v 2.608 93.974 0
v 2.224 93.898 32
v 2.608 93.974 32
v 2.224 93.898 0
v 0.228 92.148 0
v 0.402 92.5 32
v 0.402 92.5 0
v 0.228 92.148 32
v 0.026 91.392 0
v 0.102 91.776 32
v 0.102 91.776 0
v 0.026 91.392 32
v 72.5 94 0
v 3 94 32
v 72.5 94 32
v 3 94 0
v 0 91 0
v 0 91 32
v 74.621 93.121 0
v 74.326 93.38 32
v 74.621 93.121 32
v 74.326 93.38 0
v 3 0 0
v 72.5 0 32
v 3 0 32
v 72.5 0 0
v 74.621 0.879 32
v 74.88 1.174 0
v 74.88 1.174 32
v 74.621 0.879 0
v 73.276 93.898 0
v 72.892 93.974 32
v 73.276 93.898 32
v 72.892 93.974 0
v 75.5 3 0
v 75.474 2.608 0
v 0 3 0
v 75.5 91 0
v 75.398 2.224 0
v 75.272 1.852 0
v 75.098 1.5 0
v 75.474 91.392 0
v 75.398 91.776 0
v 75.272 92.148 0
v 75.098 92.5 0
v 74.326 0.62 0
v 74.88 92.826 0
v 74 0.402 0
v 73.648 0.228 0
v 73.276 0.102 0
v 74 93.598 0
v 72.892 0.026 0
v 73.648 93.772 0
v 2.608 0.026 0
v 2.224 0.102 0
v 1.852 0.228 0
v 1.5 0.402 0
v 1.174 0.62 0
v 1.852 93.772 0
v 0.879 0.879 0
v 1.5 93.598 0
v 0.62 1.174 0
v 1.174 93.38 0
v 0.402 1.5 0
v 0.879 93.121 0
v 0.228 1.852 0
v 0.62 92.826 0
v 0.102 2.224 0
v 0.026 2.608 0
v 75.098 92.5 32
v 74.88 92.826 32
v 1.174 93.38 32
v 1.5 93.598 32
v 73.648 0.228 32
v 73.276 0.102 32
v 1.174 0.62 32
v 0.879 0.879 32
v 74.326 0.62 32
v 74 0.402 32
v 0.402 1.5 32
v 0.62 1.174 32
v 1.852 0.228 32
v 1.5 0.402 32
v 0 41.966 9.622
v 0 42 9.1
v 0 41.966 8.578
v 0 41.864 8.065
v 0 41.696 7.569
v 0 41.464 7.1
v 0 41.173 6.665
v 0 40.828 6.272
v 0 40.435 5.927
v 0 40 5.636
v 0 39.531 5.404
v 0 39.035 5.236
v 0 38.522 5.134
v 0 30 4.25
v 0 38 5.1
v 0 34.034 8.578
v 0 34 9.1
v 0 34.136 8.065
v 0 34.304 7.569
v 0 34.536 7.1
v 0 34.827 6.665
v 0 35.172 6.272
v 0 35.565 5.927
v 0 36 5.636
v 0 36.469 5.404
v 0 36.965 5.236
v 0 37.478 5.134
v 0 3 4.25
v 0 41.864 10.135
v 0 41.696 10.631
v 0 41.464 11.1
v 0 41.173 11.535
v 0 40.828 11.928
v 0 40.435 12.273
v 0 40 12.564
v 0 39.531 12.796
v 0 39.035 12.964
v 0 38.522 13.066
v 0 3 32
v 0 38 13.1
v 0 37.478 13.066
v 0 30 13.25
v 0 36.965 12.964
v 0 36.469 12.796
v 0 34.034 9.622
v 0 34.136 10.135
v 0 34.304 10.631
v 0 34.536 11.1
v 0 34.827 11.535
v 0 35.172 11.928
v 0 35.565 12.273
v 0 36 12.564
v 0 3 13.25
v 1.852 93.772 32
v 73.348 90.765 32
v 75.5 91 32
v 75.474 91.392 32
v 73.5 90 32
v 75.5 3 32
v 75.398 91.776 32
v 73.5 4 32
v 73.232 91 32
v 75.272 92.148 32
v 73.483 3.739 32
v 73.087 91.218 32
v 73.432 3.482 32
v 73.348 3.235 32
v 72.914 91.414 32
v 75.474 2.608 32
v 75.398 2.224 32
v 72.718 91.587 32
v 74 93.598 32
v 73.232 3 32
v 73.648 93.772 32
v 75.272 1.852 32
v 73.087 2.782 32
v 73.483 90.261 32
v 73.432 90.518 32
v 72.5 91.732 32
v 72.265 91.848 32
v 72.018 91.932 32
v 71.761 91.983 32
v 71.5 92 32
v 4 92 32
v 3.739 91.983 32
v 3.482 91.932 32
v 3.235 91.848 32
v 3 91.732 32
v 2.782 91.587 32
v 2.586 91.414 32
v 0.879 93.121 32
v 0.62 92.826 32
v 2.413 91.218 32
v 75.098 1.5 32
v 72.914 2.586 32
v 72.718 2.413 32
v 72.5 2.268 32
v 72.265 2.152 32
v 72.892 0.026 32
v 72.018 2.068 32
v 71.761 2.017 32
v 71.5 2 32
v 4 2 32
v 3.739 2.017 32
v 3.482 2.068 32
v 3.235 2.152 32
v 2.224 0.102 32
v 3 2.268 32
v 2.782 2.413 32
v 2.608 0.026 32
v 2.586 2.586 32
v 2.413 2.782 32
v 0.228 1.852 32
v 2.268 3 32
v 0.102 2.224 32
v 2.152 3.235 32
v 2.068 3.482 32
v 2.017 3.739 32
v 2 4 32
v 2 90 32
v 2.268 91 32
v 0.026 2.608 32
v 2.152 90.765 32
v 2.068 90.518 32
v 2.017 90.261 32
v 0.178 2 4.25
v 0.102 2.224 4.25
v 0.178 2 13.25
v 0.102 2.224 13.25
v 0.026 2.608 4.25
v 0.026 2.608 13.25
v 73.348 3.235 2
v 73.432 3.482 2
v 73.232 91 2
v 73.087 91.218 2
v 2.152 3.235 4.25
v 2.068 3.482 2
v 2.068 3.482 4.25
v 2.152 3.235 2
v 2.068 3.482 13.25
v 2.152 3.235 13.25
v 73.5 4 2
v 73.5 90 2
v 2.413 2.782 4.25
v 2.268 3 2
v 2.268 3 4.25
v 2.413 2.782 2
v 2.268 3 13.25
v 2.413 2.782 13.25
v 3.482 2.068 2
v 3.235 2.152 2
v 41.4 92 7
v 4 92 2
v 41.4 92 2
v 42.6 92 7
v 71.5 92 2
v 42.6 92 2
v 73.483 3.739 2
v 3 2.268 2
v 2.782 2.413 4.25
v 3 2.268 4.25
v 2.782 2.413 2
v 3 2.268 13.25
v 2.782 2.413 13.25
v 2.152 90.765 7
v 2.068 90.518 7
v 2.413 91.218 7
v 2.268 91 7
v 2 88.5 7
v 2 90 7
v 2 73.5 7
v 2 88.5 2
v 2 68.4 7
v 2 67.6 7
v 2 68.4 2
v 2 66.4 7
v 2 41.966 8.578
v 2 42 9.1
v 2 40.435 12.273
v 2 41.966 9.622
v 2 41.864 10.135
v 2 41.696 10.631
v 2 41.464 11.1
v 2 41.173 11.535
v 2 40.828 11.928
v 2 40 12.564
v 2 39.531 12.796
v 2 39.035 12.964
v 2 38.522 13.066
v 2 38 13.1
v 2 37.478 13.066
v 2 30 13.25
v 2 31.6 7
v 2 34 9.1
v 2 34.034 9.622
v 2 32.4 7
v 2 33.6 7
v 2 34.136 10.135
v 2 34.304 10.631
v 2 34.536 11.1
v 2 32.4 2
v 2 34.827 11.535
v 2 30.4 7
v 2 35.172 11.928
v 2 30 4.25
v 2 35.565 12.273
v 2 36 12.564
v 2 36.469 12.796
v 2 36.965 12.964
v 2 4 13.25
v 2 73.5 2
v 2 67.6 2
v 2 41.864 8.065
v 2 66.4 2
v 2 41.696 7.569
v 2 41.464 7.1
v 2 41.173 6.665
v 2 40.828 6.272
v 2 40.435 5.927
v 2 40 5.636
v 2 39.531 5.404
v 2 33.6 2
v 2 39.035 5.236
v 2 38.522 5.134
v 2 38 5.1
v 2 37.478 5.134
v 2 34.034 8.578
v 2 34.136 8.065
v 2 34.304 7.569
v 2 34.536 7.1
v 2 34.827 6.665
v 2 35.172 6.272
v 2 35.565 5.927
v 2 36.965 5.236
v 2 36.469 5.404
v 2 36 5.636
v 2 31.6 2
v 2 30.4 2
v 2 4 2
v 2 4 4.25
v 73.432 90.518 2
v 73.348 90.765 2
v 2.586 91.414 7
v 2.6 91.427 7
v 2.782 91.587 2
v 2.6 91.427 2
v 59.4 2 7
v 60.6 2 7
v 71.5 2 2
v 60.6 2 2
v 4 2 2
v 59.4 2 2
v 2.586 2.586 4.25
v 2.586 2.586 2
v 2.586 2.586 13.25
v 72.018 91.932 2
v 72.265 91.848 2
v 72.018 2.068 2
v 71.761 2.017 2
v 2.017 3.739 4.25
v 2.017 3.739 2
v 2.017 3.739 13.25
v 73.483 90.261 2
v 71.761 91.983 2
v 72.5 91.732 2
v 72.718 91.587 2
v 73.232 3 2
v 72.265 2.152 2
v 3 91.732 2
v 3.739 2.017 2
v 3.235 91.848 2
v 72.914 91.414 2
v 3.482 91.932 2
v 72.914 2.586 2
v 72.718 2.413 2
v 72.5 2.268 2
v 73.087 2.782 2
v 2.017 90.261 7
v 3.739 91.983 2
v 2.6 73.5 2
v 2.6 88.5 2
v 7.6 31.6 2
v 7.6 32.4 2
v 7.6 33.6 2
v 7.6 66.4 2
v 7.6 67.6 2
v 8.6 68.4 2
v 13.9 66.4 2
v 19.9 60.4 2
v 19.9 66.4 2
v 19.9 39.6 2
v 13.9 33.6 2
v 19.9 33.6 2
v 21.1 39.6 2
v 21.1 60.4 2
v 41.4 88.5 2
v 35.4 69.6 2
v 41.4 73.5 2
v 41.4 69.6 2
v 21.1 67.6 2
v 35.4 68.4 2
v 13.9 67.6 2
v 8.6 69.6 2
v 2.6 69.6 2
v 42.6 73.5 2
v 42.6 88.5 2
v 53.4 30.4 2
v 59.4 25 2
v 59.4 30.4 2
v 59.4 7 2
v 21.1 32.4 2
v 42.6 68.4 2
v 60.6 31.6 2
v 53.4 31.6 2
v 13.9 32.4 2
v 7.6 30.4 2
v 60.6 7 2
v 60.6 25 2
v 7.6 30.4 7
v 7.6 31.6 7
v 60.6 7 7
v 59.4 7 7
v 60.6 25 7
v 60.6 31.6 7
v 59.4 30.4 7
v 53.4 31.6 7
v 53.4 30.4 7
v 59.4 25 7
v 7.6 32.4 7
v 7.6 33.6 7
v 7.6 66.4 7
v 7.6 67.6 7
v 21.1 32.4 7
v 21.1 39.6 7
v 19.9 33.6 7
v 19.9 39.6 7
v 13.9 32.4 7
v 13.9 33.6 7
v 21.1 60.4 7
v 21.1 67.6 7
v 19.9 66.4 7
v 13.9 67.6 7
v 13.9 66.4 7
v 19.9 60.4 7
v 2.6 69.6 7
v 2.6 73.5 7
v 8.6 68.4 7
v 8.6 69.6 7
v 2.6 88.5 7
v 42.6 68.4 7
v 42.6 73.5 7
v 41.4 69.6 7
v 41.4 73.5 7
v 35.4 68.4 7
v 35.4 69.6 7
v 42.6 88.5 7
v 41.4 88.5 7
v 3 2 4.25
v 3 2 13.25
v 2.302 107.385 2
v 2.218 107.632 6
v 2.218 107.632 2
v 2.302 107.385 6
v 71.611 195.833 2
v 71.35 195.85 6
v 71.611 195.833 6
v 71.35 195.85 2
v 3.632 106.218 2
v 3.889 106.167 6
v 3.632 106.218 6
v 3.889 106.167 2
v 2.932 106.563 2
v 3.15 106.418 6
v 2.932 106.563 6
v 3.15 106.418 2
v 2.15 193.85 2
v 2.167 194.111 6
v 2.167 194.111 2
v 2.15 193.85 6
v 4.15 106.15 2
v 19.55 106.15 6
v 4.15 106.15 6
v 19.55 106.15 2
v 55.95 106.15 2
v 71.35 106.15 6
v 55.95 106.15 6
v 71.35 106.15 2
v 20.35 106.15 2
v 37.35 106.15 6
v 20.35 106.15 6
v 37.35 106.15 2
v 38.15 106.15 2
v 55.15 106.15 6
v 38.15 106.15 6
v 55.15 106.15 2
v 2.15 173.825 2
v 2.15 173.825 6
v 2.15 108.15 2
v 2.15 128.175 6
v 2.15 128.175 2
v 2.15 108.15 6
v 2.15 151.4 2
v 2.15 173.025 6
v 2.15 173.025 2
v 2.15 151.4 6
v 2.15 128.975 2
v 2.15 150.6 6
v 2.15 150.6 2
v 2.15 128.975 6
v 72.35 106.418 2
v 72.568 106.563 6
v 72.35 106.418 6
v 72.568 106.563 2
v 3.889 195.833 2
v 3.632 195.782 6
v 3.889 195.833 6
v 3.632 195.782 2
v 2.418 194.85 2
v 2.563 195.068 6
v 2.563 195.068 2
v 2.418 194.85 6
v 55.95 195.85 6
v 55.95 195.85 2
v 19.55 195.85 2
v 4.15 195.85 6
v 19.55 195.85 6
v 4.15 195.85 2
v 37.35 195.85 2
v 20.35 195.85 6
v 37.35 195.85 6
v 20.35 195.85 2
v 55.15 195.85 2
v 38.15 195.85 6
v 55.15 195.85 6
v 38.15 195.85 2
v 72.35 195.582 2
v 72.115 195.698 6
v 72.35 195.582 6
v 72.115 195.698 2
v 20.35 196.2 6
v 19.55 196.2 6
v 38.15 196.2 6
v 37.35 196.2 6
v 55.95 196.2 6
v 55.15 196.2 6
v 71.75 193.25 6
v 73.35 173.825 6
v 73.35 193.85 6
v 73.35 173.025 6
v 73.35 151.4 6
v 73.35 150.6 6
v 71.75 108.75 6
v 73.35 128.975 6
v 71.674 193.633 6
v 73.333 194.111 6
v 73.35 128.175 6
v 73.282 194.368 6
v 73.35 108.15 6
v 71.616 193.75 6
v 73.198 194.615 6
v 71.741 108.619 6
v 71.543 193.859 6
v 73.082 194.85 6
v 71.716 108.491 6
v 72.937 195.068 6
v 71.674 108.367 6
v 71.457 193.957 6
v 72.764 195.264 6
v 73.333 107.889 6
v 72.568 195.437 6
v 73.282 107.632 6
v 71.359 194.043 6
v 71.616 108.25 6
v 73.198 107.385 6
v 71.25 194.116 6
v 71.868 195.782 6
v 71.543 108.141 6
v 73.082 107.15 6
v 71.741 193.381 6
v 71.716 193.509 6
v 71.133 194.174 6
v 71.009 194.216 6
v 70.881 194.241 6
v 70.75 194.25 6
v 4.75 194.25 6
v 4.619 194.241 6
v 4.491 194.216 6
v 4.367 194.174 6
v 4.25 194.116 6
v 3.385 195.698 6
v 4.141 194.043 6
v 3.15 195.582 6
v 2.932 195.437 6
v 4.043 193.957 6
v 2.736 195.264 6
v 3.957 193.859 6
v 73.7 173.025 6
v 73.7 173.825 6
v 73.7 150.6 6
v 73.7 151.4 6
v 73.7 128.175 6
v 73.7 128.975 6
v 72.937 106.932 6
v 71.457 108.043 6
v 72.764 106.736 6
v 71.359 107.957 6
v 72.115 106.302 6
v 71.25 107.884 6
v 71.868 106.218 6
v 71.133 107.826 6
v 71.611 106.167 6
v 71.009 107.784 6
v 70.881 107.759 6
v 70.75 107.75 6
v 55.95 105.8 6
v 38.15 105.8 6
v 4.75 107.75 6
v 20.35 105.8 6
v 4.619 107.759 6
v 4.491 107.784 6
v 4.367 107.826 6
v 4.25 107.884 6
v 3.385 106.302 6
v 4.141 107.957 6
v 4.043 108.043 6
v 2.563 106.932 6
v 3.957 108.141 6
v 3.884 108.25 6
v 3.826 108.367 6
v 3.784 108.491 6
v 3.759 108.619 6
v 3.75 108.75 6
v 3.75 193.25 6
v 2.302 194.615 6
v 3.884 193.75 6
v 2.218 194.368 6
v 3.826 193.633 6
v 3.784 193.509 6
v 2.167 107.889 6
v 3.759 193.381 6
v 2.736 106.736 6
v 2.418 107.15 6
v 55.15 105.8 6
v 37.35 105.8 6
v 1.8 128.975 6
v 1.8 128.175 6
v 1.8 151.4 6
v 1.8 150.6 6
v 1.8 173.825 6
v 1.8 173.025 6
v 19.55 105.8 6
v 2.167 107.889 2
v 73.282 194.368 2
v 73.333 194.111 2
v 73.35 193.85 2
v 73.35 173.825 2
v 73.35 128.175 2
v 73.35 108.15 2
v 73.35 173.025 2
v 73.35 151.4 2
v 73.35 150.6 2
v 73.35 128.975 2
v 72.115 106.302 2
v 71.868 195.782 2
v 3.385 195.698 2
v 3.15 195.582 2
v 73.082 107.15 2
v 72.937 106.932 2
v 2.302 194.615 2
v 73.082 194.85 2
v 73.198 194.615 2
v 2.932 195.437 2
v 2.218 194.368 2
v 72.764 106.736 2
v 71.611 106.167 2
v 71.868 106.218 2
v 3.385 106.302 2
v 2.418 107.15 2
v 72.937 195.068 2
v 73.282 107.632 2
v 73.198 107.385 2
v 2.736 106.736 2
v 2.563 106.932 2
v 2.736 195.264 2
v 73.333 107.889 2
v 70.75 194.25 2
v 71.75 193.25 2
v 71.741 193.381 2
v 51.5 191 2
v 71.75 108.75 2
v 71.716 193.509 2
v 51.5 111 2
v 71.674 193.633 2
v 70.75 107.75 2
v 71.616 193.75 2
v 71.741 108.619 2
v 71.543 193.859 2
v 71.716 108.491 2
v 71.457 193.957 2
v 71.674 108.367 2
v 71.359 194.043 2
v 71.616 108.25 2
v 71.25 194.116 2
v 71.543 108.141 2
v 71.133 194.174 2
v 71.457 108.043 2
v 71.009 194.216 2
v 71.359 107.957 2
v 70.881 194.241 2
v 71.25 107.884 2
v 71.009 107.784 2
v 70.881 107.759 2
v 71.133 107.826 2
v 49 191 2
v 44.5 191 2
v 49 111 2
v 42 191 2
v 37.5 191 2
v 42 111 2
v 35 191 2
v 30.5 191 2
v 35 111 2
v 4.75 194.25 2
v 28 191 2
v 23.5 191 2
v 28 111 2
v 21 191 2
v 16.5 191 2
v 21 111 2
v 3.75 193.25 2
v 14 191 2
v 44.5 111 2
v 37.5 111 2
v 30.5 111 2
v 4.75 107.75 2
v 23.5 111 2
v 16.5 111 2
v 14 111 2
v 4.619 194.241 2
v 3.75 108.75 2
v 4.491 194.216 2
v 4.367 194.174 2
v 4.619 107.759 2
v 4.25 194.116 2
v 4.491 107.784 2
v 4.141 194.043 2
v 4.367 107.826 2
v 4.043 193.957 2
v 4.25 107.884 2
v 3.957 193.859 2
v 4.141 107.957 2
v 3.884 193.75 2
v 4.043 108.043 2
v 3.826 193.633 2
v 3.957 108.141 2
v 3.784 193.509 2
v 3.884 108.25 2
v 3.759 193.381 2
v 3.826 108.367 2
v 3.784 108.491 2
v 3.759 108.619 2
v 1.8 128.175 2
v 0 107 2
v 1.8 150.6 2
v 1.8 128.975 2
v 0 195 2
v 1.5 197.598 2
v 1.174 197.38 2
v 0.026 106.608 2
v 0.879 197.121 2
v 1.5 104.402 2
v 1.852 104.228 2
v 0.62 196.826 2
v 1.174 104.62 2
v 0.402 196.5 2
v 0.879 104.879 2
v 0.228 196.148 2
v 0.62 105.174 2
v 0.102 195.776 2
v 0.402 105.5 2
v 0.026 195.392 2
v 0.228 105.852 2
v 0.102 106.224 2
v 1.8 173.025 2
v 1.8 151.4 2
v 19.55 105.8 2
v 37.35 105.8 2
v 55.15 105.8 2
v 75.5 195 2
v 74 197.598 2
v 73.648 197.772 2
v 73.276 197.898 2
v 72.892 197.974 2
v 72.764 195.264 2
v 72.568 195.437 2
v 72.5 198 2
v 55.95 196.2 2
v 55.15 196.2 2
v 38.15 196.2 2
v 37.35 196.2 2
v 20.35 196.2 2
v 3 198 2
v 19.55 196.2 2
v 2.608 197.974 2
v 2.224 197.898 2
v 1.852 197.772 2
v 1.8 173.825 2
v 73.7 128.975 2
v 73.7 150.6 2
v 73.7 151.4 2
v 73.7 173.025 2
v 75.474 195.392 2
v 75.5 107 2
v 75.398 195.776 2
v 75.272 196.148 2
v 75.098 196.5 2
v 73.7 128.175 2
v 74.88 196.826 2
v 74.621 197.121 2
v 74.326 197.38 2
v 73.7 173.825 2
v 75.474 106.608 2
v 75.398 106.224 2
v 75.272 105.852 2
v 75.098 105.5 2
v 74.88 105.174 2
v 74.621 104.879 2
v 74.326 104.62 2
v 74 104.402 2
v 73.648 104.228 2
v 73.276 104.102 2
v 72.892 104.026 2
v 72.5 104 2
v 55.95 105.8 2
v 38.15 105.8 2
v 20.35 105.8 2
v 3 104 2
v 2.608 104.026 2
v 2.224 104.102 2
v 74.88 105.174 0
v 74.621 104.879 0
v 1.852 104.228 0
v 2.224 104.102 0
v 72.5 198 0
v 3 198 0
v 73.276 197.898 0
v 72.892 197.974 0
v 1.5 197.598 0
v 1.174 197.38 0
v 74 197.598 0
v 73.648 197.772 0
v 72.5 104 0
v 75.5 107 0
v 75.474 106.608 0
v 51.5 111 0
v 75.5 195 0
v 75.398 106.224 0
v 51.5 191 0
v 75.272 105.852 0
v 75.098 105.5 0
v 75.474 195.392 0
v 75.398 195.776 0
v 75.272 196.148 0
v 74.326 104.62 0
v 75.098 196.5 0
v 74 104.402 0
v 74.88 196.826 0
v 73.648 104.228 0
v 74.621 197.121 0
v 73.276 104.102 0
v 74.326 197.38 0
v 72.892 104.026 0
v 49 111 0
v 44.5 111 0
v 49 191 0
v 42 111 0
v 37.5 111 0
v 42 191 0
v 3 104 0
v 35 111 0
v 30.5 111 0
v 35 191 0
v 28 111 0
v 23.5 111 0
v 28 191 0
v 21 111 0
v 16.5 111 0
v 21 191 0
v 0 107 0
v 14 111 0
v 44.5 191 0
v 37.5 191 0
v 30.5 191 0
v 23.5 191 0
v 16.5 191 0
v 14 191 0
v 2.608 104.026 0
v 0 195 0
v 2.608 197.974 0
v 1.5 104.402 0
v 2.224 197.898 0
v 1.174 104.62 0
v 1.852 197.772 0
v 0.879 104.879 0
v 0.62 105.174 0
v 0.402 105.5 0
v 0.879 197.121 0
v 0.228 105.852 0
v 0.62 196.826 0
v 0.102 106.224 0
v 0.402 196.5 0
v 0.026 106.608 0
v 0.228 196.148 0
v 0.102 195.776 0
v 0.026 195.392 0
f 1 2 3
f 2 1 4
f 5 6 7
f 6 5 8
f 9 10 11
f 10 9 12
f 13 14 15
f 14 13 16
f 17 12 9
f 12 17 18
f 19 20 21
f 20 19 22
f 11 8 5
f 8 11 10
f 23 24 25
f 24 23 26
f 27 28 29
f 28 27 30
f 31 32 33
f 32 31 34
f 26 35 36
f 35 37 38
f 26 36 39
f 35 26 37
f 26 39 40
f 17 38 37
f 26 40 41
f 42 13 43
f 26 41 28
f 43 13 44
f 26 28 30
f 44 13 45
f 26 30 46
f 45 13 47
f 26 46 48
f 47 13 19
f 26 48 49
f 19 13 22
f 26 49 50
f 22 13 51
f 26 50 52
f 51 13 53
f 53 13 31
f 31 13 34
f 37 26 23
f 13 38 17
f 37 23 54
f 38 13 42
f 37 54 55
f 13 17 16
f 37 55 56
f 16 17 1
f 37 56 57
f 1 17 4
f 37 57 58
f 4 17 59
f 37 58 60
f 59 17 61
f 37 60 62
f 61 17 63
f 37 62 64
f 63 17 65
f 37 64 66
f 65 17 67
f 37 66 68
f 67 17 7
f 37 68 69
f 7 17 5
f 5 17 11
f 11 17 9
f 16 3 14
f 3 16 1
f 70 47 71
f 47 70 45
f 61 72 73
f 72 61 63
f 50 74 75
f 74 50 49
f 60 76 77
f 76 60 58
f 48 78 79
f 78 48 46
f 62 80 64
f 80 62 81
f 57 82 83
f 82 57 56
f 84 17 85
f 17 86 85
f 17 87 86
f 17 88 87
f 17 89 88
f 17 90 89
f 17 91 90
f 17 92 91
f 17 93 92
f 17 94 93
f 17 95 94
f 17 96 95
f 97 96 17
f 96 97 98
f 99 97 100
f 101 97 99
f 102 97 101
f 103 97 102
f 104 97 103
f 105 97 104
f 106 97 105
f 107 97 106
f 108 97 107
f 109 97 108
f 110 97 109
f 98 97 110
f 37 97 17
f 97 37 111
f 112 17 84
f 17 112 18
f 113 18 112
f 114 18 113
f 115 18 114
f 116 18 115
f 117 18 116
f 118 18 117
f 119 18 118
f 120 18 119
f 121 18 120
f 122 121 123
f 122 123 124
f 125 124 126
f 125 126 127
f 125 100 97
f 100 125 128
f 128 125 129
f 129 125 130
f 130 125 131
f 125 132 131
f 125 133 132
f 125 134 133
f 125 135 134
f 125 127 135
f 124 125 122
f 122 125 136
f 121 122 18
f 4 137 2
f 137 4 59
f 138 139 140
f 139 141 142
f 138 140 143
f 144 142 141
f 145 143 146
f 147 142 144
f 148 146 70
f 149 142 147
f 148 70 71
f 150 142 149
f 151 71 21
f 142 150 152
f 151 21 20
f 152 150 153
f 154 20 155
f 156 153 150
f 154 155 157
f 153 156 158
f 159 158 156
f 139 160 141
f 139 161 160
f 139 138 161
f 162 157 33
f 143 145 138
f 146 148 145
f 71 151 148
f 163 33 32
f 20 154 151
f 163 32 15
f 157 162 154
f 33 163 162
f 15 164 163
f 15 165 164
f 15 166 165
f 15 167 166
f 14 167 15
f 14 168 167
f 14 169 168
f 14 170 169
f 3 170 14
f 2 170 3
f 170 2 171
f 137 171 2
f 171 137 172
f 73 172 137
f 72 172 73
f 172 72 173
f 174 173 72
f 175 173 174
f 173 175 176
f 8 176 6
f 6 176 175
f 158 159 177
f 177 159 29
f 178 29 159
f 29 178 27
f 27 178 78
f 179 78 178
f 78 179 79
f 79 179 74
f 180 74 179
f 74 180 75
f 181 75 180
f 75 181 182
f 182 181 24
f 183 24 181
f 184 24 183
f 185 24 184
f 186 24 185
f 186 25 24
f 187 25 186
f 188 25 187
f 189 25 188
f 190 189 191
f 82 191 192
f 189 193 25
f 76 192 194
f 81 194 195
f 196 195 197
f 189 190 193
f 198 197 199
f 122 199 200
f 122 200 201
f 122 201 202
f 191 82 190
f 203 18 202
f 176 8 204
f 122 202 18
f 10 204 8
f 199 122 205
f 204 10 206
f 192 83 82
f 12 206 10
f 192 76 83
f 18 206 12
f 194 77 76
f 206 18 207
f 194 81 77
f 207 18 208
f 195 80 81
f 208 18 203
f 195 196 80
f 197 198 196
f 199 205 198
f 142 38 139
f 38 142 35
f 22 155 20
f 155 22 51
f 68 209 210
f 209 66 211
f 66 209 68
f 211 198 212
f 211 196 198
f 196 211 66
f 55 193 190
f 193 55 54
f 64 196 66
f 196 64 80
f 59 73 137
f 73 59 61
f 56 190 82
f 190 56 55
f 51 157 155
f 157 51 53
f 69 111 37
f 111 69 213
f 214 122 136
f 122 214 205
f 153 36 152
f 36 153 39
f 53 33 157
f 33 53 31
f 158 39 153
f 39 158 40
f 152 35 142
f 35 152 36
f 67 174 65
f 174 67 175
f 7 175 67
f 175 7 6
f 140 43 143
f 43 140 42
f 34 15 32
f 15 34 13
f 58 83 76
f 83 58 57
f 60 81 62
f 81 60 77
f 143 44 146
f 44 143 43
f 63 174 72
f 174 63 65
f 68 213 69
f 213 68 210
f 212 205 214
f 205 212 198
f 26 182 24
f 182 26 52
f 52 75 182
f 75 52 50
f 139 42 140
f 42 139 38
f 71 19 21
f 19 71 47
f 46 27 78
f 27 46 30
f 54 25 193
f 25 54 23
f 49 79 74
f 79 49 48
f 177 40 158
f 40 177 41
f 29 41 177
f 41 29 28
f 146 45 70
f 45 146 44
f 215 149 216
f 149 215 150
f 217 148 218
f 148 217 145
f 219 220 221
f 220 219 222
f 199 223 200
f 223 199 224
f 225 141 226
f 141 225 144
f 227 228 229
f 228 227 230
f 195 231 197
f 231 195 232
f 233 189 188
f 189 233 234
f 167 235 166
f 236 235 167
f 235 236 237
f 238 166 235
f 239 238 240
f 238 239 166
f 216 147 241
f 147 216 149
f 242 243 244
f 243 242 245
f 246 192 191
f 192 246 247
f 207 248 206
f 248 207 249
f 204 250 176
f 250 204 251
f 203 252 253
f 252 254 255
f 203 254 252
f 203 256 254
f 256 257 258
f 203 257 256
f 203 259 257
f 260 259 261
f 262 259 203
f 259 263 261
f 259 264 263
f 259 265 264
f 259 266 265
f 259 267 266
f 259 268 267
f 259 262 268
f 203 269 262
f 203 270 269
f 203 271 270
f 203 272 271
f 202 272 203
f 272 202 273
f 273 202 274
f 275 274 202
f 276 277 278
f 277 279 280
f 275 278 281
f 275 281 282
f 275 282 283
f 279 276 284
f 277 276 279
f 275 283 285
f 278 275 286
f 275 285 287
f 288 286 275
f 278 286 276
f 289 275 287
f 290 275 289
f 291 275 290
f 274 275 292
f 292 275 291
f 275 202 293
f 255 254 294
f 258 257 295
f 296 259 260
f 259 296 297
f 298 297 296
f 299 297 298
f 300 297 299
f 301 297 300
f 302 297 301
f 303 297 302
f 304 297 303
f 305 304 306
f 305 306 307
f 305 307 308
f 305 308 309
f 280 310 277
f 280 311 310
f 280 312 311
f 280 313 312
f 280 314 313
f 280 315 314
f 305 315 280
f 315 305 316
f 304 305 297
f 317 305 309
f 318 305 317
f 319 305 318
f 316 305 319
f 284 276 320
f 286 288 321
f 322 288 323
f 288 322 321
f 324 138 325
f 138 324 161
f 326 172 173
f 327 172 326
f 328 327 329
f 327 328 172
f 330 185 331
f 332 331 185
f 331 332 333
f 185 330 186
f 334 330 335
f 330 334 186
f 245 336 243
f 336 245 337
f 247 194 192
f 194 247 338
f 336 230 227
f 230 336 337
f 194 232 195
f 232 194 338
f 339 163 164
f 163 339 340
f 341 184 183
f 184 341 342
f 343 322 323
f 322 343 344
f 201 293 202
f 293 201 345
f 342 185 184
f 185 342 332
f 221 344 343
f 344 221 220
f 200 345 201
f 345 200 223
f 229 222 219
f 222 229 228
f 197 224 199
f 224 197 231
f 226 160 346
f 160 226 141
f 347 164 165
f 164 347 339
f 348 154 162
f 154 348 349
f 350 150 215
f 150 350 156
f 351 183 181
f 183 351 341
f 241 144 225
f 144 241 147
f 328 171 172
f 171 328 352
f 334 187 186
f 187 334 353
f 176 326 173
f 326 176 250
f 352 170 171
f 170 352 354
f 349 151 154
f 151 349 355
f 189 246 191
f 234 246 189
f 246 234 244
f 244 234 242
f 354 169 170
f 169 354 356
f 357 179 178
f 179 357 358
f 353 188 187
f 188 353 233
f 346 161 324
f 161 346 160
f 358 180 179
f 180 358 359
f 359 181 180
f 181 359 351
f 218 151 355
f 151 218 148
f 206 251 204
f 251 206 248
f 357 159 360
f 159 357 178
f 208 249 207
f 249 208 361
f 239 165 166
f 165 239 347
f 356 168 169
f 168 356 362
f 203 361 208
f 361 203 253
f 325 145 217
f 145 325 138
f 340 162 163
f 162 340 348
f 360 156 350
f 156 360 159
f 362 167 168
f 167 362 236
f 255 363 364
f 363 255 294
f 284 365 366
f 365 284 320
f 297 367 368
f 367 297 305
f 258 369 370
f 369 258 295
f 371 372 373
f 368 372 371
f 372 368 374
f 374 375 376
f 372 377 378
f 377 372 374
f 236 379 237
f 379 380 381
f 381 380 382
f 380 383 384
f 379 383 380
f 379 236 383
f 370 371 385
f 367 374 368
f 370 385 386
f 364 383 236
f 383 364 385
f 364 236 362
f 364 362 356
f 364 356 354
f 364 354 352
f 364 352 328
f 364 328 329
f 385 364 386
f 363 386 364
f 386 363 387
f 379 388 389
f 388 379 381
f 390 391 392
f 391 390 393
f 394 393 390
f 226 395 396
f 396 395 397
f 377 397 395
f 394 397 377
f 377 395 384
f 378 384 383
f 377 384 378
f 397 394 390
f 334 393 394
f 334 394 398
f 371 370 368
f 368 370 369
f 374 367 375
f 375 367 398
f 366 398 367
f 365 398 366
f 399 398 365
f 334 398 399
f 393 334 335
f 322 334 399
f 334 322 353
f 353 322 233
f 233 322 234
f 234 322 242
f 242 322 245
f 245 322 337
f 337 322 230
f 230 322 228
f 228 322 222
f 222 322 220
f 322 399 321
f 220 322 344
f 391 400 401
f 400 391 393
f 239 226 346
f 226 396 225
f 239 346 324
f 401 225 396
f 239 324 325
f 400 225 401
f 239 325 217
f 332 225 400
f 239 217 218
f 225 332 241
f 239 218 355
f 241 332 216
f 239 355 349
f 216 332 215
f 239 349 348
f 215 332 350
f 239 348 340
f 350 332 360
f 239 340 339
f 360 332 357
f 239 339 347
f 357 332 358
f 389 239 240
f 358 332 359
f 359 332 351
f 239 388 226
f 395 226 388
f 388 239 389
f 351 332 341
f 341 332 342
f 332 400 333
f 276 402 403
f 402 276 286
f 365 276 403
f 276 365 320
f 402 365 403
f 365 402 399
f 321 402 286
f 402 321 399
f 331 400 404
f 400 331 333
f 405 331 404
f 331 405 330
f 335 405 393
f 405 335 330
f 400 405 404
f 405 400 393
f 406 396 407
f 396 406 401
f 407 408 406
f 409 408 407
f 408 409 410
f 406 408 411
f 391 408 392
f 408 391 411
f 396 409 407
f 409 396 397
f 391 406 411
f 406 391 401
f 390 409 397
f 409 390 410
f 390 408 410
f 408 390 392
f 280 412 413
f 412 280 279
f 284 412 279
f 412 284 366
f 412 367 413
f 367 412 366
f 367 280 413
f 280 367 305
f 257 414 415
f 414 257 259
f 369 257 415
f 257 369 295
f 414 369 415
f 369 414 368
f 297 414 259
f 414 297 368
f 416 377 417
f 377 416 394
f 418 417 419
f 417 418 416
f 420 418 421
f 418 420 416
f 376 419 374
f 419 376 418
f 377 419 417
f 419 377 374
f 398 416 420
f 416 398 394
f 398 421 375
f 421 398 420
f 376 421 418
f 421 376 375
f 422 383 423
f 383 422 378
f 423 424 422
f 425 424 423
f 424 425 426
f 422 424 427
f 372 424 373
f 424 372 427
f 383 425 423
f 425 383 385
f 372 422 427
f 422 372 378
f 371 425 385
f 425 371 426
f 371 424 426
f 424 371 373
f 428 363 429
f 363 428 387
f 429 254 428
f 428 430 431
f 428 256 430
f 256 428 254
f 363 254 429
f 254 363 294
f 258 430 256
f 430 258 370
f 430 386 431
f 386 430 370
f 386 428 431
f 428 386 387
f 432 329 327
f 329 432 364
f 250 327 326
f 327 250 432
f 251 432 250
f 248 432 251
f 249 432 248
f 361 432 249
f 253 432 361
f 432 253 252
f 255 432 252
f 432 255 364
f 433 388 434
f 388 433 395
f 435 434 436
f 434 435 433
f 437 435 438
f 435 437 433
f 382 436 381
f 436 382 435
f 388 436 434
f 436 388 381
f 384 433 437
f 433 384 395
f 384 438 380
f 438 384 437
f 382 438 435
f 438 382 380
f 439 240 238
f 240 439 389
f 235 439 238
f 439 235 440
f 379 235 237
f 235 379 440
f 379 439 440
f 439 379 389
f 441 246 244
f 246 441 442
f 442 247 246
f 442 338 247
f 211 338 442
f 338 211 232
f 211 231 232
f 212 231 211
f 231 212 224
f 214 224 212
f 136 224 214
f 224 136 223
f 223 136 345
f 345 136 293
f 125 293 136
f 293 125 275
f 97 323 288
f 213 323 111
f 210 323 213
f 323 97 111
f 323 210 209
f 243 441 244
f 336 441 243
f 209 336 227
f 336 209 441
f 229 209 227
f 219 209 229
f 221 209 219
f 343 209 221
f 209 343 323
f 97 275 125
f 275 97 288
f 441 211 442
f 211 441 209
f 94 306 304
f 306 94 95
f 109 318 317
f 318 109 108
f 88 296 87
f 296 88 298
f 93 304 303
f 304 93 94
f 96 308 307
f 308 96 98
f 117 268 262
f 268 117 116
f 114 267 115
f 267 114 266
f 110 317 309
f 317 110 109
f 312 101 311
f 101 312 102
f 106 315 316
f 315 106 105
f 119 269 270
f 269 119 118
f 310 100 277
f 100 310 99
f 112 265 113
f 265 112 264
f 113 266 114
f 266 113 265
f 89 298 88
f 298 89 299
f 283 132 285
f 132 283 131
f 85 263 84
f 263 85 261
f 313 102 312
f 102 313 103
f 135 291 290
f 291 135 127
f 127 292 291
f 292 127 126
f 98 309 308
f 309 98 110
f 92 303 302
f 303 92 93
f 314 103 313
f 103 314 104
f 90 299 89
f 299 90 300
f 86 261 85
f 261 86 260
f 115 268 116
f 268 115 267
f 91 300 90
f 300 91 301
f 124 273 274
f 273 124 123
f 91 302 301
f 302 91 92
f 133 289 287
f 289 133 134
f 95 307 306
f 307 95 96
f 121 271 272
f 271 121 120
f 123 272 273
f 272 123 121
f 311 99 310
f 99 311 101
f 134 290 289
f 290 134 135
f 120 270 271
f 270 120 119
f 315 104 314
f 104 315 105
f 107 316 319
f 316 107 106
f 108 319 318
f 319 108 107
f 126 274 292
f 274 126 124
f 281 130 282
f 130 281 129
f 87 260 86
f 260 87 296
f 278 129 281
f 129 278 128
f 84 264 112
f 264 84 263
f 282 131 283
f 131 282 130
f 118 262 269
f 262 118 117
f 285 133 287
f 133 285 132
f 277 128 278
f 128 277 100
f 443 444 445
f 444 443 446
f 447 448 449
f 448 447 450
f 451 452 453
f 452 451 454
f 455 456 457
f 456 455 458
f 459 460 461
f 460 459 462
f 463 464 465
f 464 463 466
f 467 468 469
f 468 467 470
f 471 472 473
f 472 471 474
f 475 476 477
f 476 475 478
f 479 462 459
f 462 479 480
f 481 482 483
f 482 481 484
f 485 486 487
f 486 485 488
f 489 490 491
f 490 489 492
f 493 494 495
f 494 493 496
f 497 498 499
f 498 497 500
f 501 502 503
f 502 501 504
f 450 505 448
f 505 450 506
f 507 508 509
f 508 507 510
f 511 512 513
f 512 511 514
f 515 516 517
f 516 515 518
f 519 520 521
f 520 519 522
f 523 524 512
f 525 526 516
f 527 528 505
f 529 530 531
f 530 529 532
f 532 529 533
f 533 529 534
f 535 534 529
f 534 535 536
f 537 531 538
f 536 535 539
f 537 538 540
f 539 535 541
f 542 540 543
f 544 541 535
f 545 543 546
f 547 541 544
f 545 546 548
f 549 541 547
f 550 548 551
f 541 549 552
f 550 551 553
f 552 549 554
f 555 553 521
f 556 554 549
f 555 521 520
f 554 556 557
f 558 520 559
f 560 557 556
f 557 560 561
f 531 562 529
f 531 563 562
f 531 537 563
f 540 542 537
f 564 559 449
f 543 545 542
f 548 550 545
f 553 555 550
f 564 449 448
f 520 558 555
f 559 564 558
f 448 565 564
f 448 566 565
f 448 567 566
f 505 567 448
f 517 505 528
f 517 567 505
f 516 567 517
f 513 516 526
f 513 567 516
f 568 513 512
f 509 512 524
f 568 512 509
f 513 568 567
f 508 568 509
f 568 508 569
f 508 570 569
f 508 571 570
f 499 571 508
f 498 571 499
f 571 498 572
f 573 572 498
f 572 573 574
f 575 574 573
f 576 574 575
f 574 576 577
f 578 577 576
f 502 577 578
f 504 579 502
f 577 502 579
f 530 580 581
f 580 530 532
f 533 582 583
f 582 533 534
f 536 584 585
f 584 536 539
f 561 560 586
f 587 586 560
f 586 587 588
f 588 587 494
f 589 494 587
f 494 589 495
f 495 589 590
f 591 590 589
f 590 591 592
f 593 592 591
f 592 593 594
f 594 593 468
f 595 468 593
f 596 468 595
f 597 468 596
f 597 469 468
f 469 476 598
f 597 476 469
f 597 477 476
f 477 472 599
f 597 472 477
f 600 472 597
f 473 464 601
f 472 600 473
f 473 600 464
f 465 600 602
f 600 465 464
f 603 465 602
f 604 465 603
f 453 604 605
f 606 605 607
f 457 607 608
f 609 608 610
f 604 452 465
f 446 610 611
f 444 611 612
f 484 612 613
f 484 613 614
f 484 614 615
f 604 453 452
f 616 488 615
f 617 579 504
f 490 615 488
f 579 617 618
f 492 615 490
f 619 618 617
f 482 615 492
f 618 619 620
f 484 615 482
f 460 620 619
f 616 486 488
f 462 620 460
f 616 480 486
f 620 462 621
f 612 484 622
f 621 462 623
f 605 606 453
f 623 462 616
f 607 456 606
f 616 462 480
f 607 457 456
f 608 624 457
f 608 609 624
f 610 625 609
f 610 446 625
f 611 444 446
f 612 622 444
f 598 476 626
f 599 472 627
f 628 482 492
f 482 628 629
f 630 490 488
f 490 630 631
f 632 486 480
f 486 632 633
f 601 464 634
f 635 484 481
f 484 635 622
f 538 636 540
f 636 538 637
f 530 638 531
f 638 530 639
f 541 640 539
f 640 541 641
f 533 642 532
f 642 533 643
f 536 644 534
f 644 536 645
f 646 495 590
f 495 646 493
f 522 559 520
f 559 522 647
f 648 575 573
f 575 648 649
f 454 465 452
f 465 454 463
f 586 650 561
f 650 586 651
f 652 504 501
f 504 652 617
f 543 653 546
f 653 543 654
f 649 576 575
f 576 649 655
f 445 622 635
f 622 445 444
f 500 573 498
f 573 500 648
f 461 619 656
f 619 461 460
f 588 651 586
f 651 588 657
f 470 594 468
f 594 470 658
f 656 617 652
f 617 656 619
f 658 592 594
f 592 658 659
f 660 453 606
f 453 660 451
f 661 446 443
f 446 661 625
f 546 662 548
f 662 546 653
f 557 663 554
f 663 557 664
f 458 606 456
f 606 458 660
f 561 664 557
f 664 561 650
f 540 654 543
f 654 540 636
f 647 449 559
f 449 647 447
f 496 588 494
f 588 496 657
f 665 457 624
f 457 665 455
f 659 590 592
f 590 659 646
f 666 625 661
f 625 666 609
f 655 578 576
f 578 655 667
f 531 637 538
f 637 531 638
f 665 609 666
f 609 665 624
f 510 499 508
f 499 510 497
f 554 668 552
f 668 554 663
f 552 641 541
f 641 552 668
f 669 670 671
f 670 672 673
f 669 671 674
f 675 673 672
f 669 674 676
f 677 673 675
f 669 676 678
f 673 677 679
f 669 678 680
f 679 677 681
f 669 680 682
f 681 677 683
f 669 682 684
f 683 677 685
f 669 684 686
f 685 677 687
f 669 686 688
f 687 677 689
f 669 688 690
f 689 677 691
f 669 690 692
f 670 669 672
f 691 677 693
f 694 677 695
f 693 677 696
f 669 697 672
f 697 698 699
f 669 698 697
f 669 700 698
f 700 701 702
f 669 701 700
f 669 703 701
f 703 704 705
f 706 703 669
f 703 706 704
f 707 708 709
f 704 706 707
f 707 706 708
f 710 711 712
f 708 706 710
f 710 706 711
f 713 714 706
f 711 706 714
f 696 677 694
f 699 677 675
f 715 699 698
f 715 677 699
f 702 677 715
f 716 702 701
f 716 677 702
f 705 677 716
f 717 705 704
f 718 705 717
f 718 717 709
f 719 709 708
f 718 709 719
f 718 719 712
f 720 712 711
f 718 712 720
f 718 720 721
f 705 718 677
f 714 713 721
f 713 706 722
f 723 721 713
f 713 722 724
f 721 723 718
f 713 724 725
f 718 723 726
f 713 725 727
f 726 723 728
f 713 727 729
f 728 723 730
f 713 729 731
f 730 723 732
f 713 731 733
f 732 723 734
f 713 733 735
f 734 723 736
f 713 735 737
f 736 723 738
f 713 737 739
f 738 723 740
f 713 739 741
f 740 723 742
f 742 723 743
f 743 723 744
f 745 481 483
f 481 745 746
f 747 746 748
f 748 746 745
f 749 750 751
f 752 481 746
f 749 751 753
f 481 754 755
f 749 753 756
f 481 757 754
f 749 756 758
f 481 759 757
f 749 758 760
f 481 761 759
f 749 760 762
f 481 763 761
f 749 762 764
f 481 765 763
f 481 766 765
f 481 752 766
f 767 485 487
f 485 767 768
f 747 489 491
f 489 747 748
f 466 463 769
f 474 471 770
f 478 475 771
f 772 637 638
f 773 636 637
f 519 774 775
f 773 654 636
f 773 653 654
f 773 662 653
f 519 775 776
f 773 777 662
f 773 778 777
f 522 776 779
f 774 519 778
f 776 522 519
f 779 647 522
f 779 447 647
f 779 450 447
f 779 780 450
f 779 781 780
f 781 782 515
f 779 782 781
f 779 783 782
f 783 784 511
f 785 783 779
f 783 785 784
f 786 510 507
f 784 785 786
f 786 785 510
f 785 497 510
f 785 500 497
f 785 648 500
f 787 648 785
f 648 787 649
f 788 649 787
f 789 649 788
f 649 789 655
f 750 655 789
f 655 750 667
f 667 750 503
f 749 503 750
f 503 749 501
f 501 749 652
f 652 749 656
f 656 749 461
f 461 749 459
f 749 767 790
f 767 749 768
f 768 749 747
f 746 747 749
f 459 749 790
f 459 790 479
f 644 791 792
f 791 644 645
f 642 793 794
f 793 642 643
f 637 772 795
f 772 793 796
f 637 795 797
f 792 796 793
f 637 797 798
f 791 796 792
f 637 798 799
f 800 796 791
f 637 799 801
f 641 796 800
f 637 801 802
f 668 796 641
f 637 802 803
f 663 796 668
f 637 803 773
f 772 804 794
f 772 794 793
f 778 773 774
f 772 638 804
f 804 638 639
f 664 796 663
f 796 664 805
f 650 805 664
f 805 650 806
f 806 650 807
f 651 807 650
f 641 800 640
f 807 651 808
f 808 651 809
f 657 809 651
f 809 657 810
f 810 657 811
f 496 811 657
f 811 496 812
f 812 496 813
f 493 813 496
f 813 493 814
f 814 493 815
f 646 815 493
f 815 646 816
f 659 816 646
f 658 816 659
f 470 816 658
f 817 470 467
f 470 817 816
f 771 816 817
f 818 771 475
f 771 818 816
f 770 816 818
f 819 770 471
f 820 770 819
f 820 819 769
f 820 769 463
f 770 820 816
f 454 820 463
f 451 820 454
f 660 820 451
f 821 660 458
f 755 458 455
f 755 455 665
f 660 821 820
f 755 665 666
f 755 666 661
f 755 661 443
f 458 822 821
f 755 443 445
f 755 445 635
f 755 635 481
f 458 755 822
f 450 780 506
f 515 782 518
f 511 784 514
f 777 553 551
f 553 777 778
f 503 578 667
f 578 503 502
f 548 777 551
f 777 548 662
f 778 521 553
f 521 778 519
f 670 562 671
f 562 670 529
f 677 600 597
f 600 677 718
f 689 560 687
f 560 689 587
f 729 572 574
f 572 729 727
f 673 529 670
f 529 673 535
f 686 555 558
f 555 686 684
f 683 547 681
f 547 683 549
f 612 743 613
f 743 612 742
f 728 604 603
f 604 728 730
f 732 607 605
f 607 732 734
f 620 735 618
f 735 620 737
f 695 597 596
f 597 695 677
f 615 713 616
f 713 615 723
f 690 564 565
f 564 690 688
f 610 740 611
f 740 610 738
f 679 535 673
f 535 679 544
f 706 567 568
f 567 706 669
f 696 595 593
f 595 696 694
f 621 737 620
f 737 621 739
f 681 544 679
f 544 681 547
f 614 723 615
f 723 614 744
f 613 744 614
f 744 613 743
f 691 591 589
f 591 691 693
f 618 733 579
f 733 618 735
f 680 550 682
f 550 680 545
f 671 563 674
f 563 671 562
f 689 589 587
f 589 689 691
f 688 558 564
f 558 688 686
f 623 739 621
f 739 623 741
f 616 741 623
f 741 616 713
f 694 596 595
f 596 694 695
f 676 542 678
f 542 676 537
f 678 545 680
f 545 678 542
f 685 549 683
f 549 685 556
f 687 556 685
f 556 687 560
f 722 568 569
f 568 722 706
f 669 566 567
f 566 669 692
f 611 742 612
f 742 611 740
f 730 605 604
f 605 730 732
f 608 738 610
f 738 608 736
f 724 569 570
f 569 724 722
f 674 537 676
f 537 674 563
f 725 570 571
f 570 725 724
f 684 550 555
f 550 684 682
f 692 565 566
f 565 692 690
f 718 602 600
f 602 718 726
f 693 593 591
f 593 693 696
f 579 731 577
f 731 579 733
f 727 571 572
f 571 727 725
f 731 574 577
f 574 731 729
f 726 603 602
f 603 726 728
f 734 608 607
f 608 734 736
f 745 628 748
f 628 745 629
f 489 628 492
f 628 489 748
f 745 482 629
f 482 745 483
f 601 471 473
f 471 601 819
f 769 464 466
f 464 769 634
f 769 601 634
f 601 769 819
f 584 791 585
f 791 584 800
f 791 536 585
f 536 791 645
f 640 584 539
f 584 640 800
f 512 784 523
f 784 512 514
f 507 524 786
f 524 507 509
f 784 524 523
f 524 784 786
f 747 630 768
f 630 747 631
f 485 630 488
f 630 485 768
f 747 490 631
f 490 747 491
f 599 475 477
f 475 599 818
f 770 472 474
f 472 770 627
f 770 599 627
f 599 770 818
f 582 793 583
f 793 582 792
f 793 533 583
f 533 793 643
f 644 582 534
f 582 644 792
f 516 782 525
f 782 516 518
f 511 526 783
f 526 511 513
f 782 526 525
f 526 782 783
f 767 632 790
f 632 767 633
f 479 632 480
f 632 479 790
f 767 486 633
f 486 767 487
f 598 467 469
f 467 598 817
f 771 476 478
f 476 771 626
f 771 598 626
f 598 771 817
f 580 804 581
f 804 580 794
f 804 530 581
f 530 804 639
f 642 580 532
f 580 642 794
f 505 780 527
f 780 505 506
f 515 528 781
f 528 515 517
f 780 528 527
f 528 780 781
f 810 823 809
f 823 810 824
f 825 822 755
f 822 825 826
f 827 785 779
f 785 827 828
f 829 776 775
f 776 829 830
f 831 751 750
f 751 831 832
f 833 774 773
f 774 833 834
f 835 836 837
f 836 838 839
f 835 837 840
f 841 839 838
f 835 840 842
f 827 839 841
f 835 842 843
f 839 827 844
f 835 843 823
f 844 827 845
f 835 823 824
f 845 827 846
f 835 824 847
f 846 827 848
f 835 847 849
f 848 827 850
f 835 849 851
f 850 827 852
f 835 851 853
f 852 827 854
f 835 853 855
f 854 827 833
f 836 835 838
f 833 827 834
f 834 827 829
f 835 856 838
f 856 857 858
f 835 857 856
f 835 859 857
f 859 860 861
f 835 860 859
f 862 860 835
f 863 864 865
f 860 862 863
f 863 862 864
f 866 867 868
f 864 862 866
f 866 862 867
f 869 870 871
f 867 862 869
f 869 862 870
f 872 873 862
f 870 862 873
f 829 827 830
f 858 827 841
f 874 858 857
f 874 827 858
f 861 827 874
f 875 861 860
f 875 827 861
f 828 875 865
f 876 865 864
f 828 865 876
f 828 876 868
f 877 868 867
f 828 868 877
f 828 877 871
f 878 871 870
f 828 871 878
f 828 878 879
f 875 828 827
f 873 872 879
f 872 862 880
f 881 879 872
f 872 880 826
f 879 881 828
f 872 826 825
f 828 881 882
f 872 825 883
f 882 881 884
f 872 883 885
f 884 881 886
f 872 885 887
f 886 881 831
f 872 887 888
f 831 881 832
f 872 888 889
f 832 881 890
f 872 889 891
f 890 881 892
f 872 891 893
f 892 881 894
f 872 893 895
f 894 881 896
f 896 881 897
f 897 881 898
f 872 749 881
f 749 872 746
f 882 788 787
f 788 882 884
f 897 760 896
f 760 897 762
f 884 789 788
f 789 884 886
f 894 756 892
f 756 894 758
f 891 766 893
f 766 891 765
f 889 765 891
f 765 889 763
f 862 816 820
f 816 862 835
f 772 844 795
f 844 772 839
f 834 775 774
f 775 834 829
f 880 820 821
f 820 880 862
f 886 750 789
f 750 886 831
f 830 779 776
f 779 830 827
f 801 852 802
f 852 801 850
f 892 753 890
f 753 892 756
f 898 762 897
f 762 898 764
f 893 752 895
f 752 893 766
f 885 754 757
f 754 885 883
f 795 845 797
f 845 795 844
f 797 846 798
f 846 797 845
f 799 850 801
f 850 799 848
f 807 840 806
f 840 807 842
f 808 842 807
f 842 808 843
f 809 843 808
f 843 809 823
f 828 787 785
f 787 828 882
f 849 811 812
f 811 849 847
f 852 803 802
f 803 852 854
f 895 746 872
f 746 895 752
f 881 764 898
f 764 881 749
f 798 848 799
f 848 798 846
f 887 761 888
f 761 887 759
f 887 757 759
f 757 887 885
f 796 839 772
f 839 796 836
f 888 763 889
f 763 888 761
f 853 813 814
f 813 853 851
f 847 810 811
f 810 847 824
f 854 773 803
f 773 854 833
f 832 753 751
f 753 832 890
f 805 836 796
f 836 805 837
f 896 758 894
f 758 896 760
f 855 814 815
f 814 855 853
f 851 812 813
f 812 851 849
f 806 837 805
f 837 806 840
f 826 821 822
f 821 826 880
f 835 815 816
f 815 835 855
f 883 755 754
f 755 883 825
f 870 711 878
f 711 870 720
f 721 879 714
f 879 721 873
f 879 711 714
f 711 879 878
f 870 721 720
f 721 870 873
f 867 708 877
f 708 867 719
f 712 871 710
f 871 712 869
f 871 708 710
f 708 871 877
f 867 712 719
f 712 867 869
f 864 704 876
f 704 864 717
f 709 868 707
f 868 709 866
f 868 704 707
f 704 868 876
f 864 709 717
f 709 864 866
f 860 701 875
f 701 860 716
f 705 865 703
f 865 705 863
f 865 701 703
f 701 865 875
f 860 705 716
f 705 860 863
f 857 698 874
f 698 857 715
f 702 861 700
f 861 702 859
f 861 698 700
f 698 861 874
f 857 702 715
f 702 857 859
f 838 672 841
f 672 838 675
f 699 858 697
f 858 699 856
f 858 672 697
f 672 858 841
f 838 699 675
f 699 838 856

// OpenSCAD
// Skambučio dėžutė: ESP32-S3-N16R8 DevKitC + GY-PCM5102 + DS3231 (ZS-042) + 1000 µF kondensatorius.
// Visi matmenys mm. Prieš spausdinant pamatuok savo plokštes ir pataisyk "Plokštės" bloką.
// STL:  openscad -D 'part="box"' -o box.stl dezute.scad   (taip pat "lid", "test" – sienelė su skylėmis bandymui)
//
// Moduliai su kontaktais aukštyn, jungiami Dupont laidais; RTC – su gamykliniais kampiniais kontaktais.
// Visos plokštės guli komponentais aukštyn. ESP32: USB į sienelę x=0, kontaktų eilė su 3V3…5Vin – į DAC pusę.
// DAC: lizdas išeina per ilgąją kraštinę, tad DAC prie sienelės x=0 guli ilgąja (32 mm) puse,
//      lizdas – tos kraštinės gale, arčiau ESP32 (USB-C).
// Išdėstymas (vaizdas iš viršaus), USB ir 3.5 mm lizdas – toje pačioje sienelėje x=0:
//   y ^  [ RTC ]>>Dupont>>
//     |  [ DAC ]
//     |  [ ESP32 ............ antena ][laisva]
//     +--------------------------------------> x
part = "all";  // "box" | "lid" | "test" | "preview" | "all"

/* [Plokštės] */
esp = [57, 28];   // ESP32 PCB: ilgis be antenos, plotis (pamatuota)
esp_ant = 6.5;    // modulio antena išsikiša už PCB galo (pamatuota)
esp_ant_w = 18;   // tarpas ribotuvuose antenai (pamatuota)
dac = [17.5, 32]; // PCM5102: gylis nuo sienelės (trumpoji kraštinė), ilgis palei sienelę – pamatuota, +0.5 po bandymo
rtc = [38, 22];   // DS3231 ZS-042 (be kontaktų), pamatuota
rtc_h = 7;        // aukštis su baterija; kampiniai kontaktai dar +5 mm (pamatuota)
rtc_pins = 22;    // 6 kampiniai kontaktai + Dupont kištukai, išsikiša į +x
rtc_pin_gap = 15; // tarpas ribotuvuose RTC galuose kontaktams (po bandymo)
rtc_back = 1;     // kitame gale tik 4 tušti pad'ai (HW-084), tad beveik prie sienelės
tape = 3.5;       // putplasčio juosta po plokštėmis: kontaktų galai apačioje kyšo ~3 mm
pcb = 1.6;
usb_h = 3.3;      // USB-C lizdo aukštis virš ESP32 PCB
jack_y = 4;       // 3.5 mm lizdo centras nuo DAC galo, artimesnio ESP32 (pamatuota 3, po bandymo +1)
jack_z = 2;       // lizdo centras virš DAC PCB (po bandymo nuleista 1 mm)
jack_d = 8;       // skylė kištukui (storesniems kištukams – 9)

/* [Dėžutė] */
wall = 2;
floor_t = 2;
lid_t = 2;
gap = 4;            // tarpas tarp plokščių
antenna_free = 8;   // laisva vieta už antenos galo
inner_h = 30;       // Dupont kištukai ant kontaktų aukštyn baigiasi ~24 mm + laido lenkimas iki dangtelio lūpos
fit = 0.15;         // dangtelio lūpos tarpas (0.3 buvo per laisvas)
crush = 0.35;       // trinties briaunelės už lūpos – susispaudžia ir laiko dangtelį; laisvas – didink, ankštas – mažink
r = 3;              // kampų apvalinimas

inner = [max(esp[0] + esp_ant + antenna_free, rtc_back + rtc[0] + rtc_pins + 2), esp[1] + gap + dac[1] + gap + rtc[1]];
outer = [inner[0] + 2 * wall, inner[1] + 2 * wall];
z0 = floor_t + tape;  // plokščių apačia

esp_pos = [0, 0];
dac_pos = [0, esp[1] + gap];
rtc_pos = [rtc_back, esp[1] + gap + dac[1] + gap];
assert(tape + rtc_h + 5 + 3 <= inner_h - 3, "RTC su kontaktais neleidžia uždėti dangtelio");
rtc_size = rtc;
// RTC eilė per dvi eiles nuo ESP32 (~29 mm), tad jos kontaktai antenos netrukdo

$fn = 48;

module rounded(size, h, rr = r) {
  hull() for (x = [rr, size[0] - rr], y = [rr, size[1] - rr]) translate([x, y, 0]) cylinder(r = rr, h = h);
}

// kampiniai L ribotuvai aplink plokštę, kad ji nesislankiotų ant juostos;
// abi L dalys ilgesnės per t ir persidengia kampe tūriu – kitaip lieka ne manifold briaunos
// gx0 / gx1: laisvas tarpas viduryje x=0 / x=galo ribotuvų (kontaktams, antenai); 0 – įprasti kampai
module stops(pos, size, gx0 = 0, gx1 = 0, h = 5, t = 1.2, l = 6, c = 0.4) {
  for (sx = [0, 1], sy = [0, 1]) {
    x = pos[0] + sx * size[0] + (sx ? c : -c - t);
    y = pos[1] + sy * size[1] + (sy ? c : -c - t);
    g = sx ? gx1 : gx0;
    ly = g ? max(t, (size[1] + 2 * c + 2 * t - g) / 2) : l + t;  // y ribotuvo ilgis nuo kampo
    translate([wall + x, wall + (sy ? pos[1] + size[1] + c + t - ly : pos[1] - c - t), floor_t - 0.5]) cube([t, ly, h + 0.5]);
    translate([wall + pos[0] + sx * (size[0] - l) + (sx ? c : -c - t), wall + y, floor_t - 0.5]) cube([l + t, t, h + 0.5]);
  }
}

module box() {
  difference() {
    union() {
      difference() {
        rounded(outer, floor_t + inner_h);
        translate([wall, wall, floor_t]) rounded(inner, inner_h + 1, r - wall / 2);
      }
      intersection() {  // ribotuvai neišlenda pro sieneles (0.5 mm į jas įeina – kad susilietų)
        translate([wall - 0.5, wall - 0.5, 0]) cube([inner[0] + 1, inner[1] + 1, floor_t + inner_h]);
        union() { stops(esp_pos, esp, 0, esp_ant_w); stops(dac_pos, dac); stops(rtc_pos, rtc_size, rtc_pin_gap, rtc_pin_gap); }
      }
    }
    // abi USB-C jungtys (kištuko korpusas ~12.5 x 7.5)
    translate([-1, wall + esp_pos[1], z0 + pcb + usb_h / 2 - 4.5]) cube([wall + 2, esp[1], 9]);
    // 3.5 mm lizdas
    translate([-1, wall + dac_pos[1] + jack_y, z0 + pcb + jack_z]) rotate([0, 90, 0]) cylinder(d = jack_d, h = wall + 2);
  }
}

module lid() {
  lip = 4;
  lw = [inner[0] - 2 * fit, inner[1] - 2 * fit];  // lūpos išorė
  difference() {
    union() {
      rounded(outer, lid_t);
      // lūpa įeina į dėžutę ir laikosi trintimi
      translate([wall + fit, wall + fit, lid_t]) difference() {
        rounded([inner[0] - 2 * fit, inner[1] - 2 * fit], lip, r - wall / 2);
        translate([1.6, 1.6, -1]) rounded([inner[0] - 2 * fit - 3.2, inner[1] - 2 * fit - 3.2], lip + 2, 1);
      }
      // trinties briaunelės: po 3 kiekvienoje pusėje, 0.3 mm įeina į lūpą (vientisas kūnas)
      translate([wall + fit, wall + fit, lid_t]) for (f = [0.25, 0.5, 0.75], side = [0, 1]) {
        translate([side ? lw[0] - 0.3 : -crush, f * lw[1] - 0.4, 0]) cube([crush + 0.3, 0.8, lip]);
        translate([f * lw[0] - 0.4, side ? lw[1] - 0.3 : -crush, 0]) cube([0.8, crush + 0.3, lip]);
      }
    }
    // ventiliacija virš ESP32 (stabilizatorius) ir DAC; antenos galo nelieskit
    for (i = [0:5]) translate([wall + 12 + i * 7, wall + 5, -1]) cube([2.5, inner[1] - 10, lid_t + 2]);
  }
}

// peržiūra: plokštės spalvotais blokais (ESP32 juoda, antena pilka, DAC violetinė, RTC mėlyna, Dupont oranžinė)
module boards() {
  translate([wall, wall, z0]) {
    color("black") cube([esp[0], esp[1], pcb]);
    color("gray") translate([esp[0] - 12, (esp[1] - esp_ant_w) / 2, pcb]) cube([12 + esp_ant, esp_ant_w, 3]);
    color("purple") translate(dac_pos) cube([dac[0], dac[1], pcb]);
    color("royalblue") translate(rtc_pos) cube([rtc[0], rtc[1], rtc_h]);
    color("orange") translate([rtc_pos[0] + rtc[0], rtc_pos[1] + 2, rtc_h]) cube([rtc_pins, rtc[1] - 4, 3]);
    color("orange") for (y = [1, esp[1] - 3.5]) translate([3, y, pcb]) cube([esp[0] - 14, 2.5, 16]);
    color("orange") translate([rtc_pos[0] - rtc_back, rtc_pos[1] + 5, rtc_h]) cube([rtc_back, rtc[1] - 10, 3]);
    color("silver") for (y = [4, esp[1] - 13]) translate([-1, y, pcb]) cube([7.5, 9, usb_h]);   // USB-C
    color("dimgray") translate([-1, dac_pos[1] + jack_y - 3, pcb]) cube([12, 6, 2 * jack_z]);    // 3.5 mm lizdas
  }
}

// bandymui: tik sienelė su USB ir 3.5 mm skylėmis + 12 mm dugno – patikrinti su tikromis plokštėmis
module test() {
  intersection() { box(); translate([-1, -1, -1]) cube([wall + 13, outer[1] + 2, floor_t + inner_h + 2]); }
}

if (part == "box") box();
else if (part == "test") test();
else if (part == "preview") { box(); boards(); }
else if (part == "lid") lid();
else { box(); translate([0, outer[1] + 10, 0]) lid(); }
